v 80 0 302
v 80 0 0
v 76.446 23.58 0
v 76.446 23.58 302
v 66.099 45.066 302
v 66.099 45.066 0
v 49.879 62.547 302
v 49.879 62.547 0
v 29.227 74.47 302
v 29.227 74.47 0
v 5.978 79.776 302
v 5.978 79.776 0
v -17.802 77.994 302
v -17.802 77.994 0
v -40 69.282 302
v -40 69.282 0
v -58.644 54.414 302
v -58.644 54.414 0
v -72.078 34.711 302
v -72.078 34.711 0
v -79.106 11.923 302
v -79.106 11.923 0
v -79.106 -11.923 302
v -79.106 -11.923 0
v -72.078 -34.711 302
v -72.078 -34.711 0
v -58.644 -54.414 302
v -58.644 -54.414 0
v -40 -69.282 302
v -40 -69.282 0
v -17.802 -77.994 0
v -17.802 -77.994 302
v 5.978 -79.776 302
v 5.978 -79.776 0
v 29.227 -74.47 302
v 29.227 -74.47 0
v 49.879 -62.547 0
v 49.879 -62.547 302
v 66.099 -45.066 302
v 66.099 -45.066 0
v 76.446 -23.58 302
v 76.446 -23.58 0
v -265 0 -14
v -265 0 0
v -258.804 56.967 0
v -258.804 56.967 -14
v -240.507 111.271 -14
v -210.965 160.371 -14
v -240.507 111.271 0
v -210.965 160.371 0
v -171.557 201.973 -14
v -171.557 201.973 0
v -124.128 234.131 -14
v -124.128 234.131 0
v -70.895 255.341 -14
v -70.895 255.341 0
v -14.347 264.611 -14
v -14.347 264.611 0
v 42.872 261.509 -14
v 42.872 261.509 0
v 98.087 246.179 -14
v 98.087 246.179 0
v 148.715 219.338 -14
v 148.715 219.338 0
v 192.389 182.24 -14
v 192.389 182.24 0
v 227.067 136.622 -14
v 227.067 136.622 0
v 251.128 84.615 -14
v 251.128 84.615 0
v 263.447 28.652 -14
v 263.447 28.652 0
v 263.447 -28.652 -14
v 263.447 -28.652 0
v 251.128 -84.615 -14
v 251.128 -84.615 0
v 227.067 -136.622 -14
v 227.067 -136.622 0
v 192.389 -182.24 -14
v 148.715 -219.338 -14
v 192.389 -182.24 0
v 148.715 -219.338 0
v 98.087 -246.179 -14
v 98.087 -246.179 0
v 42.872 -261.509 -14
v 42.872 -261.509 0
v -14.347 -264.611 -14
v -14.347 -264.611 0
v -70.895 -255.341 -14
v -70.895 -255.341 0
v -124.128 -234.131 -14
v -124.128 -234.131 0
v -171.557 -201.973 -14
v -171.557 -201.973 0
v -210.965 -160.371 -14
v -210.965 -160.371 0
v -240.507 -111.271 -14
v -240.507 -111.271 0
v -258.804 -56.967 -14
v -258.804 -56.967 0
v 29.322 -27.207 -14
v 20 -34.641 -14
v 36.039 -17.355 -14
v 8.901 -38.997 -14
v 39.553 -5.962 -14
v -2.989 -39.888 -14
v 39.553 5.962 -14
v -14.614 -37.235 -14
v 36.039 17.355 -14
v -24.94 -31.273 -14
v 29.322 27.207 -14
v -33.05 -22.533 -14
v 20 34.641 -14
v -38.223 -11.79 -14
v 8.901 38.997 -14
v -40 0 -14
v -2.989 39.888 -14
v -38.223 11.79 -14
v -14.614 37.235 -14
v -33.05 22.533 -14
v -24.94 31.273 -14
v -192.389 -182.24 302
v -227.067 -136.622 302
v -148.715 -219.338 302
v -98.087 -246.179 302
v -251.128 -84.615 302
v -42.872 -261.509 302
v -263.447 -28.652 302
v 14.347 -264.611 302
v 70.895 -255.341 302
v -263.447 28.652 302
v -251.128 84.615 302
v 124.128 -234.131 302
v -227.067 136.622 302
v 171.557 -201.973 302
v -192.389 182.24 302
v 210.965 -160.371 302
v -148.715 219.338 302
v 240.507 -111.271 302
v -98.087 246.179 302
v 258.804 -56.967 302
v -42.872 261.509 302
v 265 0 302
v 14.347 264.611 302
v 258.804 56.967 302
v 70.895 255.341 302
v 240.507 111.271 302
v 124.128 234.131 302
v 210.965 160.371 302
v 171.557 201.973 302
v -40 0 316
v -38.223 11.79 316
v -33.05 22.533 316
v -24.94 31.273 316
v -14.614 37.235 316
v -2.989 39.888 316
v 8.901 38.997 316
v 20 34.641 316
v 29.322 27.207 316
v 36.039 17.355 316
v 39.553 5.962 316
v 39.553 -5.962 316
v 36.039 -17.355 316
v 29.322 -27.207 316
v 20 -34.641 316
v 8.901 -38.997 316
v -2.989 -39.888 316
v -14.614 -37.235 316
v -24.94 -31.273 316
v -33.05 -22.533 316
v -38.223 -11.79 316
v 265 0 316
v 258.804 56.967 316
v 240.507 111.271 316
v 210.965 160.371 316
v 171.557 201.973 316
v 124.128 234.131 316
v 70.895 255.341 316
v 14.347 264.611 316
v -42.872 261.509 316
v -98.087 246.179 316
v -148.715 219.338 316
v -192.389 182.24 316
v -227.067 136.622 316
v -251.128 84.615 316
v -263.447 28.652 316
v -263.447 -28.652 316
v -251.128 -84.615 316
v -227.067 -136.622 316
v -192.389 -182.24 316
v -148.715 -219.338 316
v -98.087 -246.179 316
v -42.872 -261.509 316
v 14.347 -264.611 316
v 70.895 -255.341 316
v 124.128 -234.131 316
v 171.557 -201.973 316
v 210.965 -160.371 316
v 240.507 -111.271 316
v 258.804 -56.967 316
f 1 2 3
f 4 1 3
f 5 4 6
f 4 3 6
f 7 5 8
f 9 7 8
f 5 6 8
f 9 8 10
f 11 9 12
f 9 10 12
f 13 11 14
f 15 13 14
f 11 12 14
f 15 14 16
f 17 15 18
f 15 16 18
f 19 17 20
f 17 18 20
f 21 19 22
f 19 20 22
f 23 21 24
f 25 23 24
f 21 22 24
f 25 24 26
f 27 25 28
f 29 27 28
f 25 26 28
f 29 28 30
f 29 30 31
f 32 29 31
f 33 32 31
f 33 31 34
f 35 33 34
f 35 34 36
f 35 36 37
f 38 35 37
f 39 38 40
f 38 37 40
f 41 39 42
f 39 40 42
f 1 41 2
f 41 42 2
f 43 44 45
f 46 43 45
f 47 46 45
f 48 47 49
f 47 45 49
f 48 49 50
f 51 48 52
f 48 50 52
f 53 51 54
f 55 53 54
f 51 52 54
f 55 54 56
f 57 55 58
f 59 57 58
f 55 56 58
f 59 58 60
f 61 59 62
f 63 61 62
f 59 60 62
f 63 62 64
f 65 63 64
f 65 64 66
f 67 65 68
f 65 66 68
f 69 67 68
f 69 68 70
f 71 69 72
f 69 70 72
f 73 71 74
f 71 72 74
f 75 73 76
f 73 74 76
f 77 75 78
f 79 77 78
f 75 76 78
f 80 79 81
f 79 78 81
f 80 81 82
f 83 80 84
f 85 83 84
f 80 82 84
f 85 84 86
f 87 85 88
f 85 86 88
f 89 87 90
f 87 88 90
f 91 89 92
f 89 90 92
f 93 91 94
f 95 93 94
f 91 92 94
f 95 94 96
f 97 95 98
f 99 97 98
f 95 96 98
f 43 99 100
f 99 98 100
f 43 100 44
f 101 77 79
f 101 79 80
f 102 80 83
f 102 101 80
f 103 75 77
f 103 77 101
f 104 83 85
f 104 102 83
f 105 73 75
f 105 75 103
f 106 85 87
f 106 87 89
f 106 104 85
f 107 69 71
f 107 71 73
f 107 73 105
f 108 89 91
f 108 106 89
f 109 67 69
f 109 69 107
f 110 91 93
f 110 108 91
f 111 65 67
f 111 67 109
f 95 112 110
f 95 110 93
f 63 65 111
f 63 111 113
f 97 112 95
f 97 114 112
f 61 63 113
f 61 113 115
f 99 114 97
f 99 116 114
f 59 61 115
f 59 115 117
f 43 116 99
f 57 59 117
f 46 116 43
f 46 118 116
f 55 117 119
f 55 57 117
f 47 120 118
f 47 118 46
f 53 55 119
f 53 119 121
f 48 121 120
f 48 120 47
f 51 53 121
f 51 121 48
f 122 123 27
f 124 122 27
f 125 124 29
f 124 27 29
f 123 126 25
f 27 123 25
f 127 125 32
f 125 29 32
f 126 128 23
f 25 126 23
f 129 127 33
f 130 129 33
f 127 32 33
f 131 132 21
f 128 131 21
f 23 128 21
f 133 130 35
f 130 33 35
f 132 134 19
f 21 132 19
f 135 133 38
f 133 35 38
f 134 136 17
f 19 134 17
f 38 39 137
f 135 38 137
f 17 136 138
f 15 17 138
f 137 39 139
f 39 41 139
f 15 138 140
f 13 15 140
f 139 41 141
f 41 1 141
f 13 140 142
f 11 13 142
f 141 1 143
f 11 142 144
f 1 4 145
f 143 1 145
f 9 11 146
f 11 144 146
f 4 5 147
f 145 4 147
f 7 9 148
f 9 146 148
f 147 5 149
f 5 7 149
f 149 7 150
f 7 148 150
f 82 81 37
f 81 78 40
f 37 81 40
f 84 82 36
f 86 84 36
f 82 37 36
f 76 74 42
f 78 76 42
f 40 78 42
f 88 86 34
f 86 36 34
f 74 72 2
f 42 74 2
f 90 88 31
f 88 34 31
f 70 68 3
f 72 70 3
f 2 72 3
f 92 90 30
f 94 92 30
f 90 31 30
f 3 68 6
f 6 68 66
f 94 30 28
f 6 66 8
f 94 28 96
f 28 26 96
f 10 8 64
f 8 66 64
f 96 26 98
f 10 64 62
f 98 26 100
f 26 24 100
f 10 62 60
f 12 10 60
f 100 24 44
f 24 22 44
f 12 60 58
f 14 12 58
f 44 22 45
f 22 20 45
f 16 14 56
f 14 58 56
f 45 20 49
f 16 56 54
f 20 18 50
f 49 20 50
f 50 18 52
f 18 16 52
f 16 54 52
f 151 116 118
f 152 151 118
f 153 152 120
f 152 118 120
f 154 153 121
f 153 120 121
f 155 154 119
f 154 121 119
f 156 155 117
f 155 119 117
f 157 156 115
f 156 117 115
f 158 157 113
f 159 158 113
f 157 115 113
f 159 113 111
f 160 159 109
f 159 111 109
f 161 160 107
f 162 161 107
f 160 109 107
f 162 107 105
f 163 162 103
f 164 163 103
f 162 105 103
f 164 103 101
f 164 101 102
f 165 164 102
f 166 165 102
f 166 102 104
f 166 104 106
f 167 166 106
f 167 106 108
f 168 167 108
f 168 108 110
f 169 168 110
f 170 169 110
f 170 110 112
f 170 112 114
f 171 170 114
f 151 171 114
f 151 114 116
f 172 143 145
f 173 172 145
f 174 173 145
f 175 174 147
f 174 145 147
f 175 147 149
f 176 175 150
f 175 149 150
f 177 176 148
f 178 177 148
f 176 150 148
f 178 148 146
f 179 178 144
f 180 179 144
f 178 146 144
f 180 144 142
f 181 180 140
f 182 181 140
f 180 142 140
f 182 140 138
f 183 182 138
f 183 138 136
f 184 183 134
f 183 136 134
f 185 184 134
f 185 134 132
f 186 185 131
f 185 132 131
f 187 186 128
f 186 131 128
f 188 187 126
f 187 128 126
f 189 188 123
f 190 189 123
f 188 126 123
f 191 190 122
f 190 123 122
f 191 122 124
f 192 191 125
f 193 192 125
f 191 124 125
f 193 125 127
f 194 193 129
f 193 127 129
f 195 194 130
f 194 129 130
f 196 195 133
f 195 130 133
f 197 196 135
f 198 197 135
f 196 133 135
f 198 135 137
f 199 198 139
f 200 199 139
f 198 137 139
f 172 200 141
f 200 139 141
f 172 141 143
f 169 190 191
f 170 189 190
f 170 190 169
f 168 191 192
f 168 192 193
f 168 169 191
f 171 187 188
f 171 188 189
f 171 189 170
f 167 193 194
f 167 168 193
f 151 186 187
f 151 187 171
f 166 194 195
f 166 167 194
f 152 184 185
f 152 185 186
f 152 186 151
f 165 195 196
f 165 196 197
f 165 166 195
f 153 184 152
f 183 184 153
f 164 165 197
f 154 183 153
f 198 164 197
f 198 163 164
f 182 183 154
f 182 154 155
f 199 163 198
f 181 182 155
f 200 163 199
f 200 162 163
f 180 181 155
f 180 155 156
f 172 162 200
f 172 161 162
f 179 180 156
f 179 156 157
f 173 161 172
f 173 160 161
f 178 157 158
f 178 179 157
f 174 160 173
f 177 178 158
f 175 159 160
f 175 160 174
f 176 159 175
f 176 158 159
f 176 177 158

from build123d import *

# Parameters (mm, degrees)
SKETCH_1_R          = 80
EXTRUDE_1_DEPTH     = 302
SKETCH_2_R          = 265
EXTRUDE_2_DEPTH     = 14
SKETCH_3_R          = 265
EXTRUDE_3_DEPTH     = 14
SKETCH_4_R          = 40
CUT_EXTRUDE_1_DEPTH = 331


with BuildPart() as part:
    # Эскиз1 → Бобышка-Вытянуть1 (new body)
    with BuildSketch(Plane.XY):
        Circle(SKETCH_1_R)
    extrude(amount=EXTRUDE_1_DEPTH)

    # Эскиз2 → Бобышка-Вытянуть2 (add)
    with BuildSketch(Plane(origin=(0, 0, 0), x_dir=(-1, 0, 0), z_dir=(0, 0, -1))):
        Circle(SKETCH_2_R)
    extrude(amount=EXTRUDE_2_DEPTH)

    # Эскиз3 → Бобышка-Вытянуть3 (add)
    with BuildSketch(Plane.XY.offset(302)):
        Circle(SKETCH_3_R)
    extrude(amount=EXTRUDE_3_DEPTH)

    # Эскиз4 → Вырез-Вытянуть1 (cut, through all)
    with BuildSketch(Plane(origin=(0, 0, -14), x_dir=(-1, 0, 0), z_dir=(0, 0, -1))):
        Circle(SKETCH_4_R)
    extrude(amount=-CUT_EXTRUDE_1_DEPTH, mode=Mode.SUBTRACT)


solid = part.part
